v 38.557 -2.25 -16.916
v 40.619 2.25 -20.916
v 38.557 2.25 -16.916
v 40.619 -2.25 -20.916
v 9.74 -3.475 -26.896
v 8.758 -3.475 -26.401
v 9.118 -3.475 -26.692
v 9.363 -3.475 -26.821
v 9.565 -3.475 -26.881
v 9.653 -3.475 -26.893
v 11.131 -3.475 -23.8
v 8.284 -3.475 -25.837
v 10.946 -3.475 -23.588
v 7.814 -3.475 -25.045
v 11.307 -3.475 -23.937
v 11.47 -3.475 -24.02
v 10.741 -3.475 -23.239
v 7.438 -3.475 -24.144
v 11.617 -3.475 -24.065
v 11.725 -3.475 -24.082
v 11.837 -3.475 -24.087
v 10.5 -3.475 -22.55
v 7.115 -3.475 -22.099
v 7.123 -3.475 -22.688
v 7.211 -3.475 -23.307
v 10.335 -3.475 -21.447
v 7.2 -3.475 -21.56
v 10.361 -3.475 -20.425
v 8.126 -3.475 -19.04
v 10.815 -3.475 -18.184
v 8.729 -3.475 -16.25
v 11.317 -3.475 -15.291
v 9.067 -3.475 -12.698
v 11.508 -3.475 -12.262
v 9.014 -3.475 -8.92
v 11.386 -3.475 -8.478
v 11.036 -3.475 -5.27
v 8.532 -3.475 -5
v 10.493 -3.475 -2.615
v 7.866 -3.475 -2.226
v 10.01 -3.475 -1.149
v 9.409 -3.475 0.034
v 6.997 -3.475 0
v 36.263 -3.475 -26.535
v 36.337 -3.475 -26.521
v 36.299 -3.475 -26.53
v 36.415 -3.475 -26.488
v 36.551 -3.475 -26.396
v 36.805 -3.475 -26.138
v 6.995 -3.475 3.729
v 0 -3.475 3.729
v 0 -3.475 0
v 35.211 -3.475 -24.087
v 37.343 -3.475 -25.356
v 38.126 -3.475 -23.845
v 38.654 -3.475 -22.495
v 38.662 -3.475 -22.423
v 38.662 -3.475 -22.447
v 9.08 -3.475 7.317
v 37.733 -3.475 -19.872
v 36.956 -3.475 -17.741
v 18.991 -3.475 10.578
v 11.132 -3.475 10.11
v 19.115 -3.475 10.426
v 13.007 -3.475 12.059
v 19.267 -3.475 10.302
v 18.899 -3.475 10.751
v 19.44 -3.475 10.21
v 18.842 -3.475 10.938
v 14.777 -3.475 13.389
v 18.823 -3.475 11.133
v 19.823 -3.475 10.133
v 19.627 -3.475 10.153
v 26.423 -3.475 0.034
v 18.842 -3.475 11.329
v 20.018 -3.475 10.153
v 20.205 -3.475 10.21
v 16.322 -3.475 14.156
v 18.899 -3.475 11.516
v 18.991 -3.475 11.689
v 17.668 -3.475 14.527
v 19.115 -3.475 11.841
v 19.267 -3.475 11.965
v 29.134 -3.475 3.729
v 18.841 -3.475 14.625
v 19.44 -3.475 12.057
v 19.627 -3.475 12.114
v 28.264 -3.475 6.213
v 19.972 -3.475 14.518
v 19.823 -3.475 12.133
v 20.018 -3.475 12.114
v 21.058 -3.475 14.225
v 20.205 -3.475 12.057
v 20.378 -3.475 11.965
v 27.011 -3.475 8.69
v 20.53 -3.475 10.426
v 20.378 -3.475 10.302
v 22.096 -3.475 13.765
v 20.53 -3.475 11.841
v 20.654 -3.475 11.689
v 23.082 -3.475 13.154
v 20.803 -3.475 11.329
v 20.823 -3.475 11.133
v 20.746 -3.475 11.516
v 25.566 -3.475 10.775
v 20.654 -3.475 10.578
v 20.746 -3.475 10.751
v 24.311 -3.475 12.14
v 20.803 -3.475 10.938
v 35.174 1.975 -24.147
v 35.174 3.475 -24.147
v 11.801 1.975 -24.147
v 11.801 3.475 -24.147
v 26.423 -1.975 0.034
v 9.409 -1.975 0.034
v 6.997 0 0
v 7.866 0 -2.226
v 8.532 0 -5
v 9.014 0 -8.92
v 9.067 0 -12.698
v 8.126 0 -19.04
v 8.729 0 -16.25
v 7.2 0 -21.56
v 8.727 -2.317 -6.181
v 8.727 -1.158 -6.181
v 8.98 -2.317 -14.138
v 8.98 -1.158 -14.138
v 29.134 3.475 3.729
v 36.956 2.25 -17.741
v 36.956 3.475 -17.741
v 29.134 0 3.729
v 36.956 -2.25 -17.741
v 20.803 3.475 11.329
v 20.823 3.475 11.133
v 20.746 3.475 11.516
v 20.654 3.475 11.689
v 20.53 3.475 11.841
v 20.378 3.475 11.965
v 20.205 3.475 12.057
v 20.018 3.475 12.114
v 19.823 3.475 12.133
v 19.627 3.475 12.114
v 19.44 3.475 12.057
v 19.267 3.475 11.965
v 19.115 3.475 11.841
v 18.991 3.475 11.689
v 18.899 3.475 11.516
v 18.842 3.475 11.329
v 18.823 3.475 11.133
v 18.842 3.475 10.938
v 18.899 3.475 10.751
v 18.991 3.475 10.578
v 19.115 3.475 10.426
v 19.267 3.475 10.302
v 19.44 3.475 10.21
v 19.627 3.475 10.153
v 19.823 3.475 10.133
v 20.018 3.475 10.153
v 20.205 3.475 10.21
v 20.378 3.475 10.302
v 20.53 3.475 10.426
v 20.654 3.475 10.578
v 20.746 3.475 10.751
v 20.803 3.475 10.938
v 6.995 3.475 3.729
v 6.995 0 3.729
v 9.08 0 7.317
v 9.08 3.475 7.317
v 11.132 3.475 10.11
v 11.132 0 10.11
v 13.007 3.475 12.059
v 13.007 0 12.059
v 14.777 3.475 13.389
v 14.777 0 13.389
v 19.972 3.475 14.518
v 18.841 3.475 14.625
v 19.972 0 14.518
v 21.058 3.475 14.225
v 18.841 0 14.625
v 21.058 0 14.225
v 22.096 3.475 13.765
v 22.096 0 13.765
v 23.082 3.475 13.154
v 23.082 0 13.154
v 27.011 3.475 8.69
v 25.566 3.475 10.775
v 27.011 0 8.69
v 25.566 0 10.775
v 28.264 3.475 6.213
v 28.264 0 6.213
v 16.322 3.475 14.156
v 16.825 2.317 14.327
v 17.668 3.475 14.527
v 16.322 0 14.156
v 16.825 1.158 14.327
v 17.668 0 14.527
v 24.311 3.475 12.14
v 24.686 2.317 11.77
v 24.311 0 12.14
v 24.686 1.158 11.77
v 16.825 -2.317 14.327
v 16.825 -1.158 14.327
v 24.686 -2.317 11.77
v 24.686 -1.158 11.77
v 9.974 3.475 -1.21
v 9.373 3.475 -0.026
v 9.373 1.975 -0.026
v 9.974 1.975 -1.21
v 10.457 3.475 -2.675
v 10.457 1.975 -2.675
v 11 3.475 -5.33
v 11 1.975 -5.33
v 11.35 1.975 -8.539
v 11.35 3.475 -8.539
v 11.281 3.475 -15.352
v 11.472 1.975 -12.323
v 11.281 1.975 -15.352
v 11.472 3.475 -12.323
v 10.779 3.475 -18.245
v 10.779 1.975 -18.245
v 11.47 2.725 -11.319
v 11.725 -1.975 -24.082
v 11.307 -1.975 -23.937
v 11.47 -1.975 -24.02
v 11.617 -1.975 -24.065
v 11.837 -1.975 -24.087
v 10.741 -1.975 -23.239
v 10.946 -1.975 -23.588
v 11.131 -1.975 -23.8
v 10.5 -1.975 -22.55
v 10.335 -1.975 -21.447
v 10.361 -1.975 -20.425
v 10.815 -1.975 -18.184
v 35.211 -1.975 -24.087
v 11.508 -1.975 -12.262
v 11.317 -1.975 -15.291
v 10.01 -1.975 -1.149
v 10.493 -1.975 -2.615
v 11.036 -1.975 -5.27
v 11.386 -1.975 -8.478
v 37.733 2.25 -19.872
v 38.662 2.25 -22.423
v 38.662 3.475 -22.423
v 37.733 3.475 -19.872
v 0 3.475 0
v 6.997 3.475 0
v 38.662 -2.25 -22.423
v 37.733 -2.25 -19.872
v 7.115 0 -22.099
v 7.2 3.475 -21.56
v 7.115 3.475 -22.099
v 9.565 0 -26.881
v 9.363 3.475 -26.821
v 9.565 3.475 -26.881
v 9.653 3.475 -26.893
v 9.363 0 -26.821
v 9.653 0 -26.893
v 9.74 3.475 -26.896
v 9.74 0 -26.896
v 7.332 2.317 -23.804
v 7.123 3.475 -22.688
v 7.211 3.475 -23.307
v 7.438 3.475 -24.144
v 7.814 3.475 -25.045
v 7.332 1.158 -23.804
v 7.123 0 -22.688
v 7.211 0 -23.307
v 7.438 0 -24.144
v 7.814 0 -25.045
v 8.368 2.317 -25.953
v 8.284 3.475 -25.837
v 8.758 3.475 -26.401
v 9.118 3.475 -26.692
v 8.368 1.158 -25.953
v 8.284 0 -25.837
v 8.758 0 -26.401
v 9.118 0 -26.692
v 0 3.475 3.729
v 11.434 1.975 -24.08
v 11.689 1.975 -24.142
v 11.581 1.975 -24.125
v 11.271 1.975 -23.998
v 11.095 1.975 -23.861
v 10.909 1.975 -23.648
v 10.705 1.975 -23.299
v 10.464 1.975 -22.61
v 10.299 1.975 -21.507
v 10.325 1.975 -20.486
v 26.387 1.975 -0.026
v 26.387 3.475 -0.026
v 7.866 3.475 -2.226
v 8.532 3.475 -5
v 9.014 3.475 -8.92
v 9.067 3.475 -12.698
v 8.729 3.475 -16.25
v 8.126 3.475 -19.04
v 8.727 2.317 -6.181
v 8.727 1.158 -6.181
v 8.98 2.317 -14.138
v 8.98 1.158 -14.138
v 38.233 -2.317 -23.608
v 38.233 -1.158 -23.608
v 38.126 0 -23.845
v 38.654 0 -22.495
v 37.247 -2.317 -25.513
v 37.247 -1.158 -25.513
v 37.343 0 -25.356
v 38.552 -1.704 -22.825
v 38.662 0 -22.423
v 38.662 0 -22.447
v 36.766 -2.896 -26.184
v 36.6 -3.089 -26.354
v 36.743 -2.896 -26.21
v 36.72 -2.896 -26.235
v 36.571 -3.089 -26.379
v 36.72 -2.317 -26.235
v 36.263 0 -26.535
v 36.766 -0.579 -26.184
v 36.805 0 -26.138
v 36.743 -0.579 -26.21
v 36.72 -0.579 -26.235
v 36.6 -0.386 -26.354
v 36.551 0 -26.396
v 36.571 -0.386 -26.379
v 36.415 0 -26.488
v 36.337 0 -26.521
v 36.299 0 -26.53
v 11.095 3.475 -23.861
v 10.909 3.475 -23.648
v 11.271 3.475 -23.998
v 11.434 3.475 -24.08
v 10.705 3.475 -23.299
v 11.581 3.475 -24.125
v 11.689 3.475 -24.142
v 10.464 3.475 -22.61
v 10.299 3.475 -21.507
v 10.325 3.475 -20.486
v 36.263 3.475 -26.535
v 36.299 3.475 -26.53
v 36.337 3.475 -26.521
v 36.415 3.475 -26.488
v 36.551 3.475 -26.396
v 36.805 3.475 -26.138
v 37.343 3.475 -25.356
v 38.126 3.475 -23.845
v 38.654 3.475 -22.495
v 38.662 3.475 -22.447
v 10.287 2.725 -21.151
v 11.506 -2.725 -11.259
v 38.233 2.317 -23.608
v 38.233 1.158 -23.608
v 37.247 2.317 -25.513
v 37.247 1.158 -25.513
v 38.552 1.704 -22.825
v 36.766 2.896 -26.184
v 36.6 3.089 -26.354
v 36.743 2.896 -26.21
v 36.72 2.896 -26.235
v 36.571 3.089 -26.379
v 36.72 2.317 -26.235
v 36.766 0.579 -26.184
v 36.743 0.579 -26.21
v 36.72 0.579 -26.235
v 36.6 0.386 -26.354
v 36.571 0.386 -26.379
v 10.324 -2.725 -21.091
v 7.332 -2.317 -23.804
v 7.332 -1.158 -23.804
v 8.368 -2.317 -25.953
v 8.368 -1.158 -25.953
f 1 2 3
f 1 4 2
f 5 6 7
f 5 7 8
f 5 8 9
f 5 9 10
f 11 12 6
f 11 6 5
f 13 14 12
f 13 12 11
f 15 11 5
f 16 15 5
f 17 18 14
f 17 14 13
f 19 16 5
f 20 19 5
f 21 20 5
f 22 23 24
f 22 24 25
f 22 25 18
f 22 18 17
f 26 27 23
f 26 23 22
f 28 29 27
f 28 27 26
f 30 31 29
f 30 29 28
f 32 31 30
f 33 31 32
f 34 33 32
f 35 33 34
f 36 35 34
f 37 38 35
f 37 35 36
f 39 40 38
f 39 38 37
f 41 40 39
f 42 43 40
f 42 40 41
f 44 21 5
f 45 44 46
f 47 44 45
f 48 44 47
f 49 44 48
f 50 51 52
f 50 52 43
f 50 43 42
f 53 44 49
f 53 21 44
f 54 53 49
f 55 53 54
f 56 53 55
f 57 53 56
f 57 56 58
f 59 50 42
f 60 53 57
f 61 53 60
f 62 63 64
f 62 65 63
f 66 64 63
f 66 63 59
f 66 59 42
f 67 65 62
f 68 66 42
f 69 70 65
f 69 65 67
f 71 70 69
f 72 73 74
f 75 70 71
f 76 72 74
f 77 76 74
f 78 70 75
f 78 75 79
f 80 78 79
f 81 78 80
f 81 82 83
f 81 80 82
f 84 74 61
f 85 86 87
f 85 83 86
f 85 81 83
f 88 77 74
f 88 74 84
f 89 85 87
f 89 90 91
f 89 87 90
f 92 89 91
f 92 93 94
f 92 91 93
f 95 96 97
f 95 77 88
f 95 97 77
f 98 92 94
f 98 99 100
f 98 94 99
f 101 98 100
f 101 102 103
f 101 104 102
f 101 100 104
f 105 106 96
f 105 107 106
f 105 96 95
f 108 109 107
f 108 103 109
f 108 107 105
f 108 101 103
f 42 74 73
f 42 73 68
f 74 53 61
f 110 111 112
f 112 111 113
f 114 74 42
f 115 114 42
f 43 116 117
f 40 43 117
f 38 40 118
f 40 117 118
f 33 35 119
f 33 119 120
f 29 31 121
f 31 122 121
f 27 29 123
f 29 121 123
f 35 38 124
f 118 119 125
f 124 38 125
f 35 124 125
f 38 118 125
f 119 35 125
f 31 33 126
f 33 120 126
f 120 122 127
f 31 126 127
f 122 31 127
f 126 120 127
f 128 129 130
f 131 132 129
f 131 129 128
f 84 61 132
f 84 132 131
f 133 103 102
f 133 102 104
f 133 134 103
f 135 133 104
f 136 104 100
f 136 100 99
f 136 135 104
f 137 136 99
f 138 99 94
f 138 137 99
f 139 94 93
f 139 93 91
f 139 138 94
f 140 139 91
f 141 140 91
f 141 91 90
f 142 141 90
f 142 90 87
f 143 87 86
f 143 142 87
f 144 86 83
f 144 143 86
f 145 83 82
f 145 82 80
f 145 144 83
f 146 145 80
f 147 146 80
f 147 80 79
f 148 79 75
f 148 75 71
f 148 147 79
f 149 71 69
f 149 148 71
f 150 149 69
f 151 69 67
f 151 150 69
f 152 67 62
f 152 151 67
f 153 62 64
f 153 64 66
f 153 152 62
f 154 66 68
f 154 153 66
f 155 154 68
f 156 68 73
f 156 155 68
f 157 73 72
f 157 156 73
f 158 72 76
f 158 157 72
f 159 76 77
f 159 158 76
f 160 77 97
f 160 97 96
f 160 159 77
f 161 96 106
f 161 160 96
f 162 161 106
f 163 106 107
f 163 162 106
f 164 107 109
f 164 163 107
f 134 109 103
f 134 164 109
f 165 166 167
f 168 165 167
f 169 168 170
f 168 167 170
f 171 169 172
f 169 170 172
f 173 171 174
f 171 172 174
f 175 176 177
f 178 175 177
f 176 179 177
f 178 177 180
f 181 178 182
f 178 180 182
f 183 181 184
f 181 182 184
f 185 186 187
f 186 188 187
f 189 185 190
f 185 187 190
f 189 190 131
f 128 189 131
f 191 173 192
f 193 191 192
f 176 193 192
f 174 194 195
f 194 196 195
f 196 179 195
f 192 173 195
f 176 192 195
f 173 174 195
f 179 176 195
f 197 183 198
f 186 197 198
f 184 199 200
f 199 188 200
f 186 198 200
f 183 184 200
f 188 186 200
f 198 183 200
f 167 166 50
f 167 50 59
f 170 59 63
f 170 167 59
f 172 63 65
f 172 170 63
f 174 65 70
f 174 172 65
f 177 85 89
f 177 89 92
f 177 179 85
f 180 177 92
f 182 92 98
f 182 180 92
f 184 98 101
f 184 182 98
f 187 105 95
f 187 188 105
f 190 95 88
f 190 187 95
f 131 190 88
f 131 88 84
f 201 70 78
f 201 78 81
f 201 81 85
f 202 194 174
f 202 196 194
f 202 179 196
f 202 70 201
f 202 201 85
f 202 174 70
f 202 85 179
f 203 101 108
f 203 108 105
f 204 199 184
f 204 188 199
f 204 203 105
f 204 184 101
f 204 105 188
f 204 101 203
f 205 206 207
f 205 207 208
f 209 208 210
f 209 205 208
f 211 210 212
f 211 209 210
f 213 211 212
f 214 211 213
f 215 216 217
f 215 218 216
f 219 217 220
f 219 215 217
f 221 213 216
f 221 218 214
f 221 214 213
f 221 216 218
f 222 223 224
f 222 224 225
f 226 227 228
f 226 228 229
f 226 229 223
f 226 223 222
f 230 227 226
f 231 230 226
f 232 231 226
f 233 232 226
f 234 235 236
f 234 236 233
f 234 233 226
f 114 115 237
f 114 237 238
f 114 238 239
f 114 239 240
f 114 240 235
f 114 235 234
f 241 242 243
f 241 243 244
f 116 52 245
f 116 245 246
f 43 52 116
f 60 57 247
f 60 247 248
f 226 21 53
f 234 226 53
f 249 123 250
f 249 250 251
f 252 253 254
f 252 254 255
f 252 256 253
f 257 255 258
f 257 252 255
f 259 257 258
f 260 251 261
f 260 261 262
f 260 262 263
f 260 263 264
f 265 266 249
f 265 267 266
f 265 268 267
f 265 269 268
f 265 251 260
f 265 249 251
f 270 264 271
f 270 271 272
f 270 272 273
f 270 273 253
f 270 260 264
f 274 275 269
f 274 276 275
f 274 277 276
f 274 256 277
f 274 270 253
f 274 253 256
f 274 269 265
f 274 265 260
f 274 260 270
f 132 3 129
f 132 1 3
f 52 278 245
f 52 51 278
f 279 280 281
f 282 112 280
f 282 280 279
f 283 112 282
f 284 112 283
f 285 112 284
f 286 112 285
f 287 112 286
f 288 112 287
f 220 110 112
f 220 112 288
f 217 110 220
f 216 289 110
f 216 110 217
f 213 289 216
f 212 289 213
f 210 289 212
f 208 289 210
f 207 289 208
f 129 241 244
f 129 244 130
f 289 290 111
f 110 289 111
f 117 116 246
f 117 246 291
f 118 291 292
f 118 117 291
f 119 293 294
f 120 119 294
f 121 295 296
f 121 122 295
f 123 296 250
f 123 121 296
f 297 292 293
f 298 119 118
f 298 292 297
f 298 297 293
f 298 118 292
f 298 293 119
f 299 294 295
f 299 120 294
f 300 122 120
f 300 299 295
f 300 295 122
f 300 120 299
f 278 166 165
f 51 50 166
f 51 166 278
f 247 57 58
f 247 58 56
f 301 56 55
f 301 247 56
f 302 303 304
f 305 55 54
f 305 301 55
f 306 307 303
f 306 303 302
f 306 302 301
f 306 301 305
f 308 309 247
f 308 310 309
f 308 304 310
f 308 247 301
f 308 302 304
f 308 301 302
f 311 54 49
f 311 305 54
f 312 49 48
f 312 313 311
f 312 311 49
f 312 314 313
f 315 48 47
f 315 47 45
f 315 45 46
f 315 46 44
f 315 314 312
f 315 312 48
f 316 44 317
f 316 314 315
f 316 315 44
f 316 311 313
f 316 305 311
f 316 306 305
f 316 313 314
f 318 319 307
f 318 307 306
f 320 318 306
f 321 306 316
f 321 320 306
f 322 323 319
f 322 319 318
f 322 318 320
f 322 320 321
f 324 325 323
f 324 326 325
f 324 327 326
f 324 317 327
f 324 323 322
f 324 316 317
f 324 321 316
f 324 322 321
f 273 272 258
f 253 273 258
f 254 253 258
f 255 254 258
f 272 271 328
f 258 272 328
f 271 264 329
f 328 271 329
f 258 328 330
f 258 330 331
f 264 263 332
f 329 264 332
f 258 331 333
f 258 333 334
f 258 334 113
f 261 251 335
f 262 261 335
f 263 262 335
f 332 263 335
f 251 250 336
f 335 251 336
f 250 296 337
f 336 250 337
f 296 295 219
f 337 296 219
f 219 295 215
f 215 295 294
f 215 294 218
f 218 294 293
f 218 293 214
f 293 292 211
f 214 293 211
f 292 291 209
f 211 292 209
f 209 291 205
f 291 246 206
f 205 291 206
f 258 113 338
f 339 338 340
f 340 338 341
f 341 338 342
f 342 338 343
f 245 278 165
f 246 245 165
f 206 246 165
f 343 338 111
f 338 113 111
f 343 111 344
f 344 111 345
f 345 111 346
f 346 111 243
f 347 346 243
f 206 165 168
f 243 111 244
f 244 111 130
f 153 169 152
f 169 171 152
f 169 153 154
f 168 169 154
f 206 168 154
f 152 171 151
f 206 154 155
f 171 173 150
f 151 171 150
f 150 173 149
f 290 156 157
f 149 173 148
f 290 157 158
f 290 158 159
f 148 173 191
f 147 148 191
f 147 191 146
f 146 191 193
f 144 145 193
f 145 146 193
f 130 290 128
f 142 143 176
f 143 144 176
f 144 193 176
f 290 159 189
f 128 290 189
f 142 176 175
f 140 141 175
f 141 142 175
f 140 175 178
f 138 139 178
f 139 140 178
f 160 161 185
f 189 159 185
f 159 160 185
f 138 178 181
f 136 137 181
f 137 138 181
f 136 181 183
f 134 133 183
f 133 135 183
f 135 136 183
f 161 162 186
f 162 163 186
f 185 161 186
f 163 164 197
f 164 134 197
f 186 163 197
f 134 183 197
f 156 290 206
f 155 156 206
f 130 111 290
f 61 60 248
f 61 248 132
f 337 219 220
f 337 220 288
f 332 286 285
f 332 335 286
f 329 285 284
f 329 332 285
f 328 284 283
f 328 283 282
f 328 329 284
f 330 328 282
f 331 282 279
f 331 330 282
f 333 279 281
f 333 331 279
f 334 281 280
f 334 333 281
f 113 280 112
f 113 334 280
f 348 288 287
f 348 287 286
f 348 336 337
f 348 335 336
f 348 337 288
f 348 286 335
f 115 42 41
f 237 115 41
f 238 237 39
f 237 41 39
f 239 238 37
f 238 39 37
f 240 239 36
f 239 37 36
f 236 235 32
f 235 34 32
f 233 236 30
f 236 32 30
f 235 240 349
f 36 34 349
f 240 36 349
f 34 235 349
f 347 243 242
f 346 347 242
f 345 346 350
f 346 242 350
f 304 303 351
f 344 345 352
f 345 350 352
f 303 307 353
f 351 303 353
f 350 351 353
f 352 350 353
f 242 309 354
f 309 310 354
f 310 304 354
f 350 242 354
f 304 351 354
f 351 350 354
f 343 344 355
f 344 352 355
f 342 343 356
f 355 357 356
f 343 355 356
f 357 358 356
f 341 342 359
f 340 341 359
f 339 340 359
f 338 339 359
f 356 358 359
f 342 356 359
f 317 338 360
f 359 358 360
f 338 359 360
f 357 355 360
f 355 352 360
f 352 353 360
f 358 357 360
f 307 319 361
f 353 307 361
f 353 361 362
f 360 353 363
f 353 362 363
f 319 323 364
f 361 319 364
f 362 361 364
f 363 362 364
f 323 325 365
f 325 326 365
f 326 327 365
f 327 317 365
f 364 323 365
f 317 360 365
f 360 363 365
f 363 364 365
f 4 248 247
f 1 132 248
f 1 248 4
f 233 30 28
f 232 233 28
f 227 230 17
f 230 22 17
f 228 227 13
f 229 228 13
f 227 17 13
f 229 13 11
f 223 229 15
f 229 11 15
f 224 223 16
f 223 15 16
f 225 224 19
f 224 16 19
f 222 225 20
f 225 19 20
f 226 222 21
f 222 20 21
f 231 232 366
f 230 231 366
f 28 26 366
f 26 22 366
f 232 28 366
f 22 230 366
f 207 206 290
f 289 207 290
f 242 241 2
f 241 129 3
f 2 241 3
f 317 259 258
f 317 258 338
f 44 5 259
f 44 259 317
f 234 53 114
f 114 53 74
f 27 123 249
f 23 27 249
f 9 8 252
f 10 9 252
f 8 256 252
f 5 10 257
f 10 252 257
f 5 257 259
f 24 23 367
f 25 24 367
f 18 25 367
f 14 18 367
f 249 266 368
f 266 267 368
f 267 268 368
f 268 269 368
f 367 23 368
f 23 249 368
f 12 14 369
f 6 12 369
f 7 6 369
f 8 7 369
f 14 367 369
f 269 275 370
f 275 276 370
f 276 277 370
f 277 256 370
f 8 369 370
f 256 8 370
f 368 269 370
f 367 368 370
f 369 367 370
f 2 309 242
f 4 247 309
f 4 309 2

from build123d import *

# Parameters (mm, degrees)
F0_R     = 1
F1_DEPTH = 3.475
F2_DEPTH = 2.25
F4_DEPTH = 1.5
F6_DEPTH = 1.5


with BuildPart() as f1:
    # F0 (on Front) → F1 (new body, symmetric)
    with BuildSketch(Plane.XZ):
        with BuildLine():
            Line((0, 3.7288318854), (0, 0))
            Line((0, 0), (6.9967252202, 0))
            add(Edge.make_bspline(
                [(6.9967252202, 0), (9.2797642574, -4.5221908949), (10.1809287444, -15.1755161159), (7.2002517991, -21.5603647329)],
                knots=[0, 0, 0, 0, 21.5613253416, 21.5613253416, 21.5613253416, 21.5613253416], degree=3))
            add(Edge.make_bspline(
                [(7.2002517991, -21.5603647329), (6.6914390773, -23.4825400211), (8.3887010693, -26.9248684867), (9.7404803961, -26.8961938314)],
                knots=[0, 0, 0, 0, 5.9096390324, 5.9096390324, 5.9096390324, 5.9096390324], degree=3))
            Line((9.7404803961, -26.8961938314), (36.2628367926, -26.5350107441))
            add(Edge.make_bspline(
                [(38.6619754136, -22.4225856364), (38.6969335377, -22.7146428078), (37.0609843214, -26.4885407062), (36.2628367926, -26.5350107441)],
                knots=[0, 0, 0, 0, 4.7610824808, 4.7610824808, 4.7610824808, 4.7610824808], degree=3))
            Line((38.6619754136, -22.4225856364), (37.7328934056, -19.8724068204))
            Line((37.7328934056, -19.8724068204), (36.9564835581, -17.741288223))
            Line((36.9564835581, -17.741288223), (29.1344821453, 3.7288318854))
            add(Edge.make_bspline(
                [(6.9949179888, 3.7288318854), (17.3287056386, 23.4605930746), (26.8724299967, 11.955557391), (29.1344821453, 3.7288318854)],
                knots=[0, 0, 0, 0, 22.1395641565, 22.1395641565, 22.1395641565, 22.1395641565], degree=3))
            Line((6.9949179888, 3.7288318854), (0, 3.7288318854))
        make_face()
        with BuildLine():
            add(Edge.make_bspline(
                [(9.4467252202, 0), (10.9906066209, -2.3621518631), (11.8817396227, -11.8382899378), (11.3527391163, -15.8558540684), (10.8528801655, -18.2185956272)],
                knots=[0, 0, 0, 0, 0.5622964622, 1, 1, 1, 1], degree=3))
            Line((9.4467252202, 0), (26.4606260202, 0))
            Line((26.4606260202, 0), (35.2483888837, -24.1209780218))
            Line((35.2483888837, -24.1209780218), (32.2012024882, -24.1209780218))
            Line((32.2012024882, -24.1209780218), (11.8752977761, -24.1209780218))
            add(Edge.make_bspline(
                [(10.8528801655, -18.2185956272), (10.6736963888, -19.4107137837), (10.0184677383, -20.6313388233), (10.7373066785, -24.130475951), (11.8752977761, -24.1209780218)],
                knots=[0, 0, 0, 0, 0.4837506013, 1, 1, 1, 1], degree=3))
        make_face(mode=Mode.SUBTRACT)
        with Locations((19.8225565255, 11.1334240064)):
            Circle(F0_R, mode=Mode.SUBTRACT)
        with BuildLine():
            Line((26.4606260202, 0), (9.4467252202, 0))
            add(Edge.make_bspline(
                [(9.4467252202, 0), (10.9906066209, -2.3621518631), (11.8817396227, -11.8382899378), (11.3527391163, -15.8558540684), (10.8528801655, -18.2185956272)],
                knots=[0, 0, 0, 0, 0.5622964622, 1, 1, 1, 1], degree=3))
            add(Edge.make_bspline(
                [(10.8528801655, -18.2185956272), (10.6736963888, -19.4107137837), (10.0184677383, -20.6313388233), (10.7373066785, -24.130475951), (11.8752977761, -24.1209780218)],
                knots=[0, 0, 0, 0, 0.4837506013, 1, 1, 1, 1], degree=3))
            Line((11.8752977761, -24.1209780218), (32.2012024882, -24.1209780218))
            Line((32.2012024882, -24.1209780218), (35.2483888837, -24.1209780218))
            Line((35.2483888837, -24.1209780218), (26.4606260202, 0))
        make_face()
    extrude(amount=F1_DEPTH, both=True)

    # F0 (on Front) → F2 (join, symmetric)
    with BuildSketch(Plane.XZ):
        Polygon((38.5574395408, -16.9160417945), (36.9564835581, -17.741288223), (37.7328934056, -19.8724068204), (39.5883468265, -18.9159743354), align=None)
        Polygon((39.5883468265, -18.9159743354), (37.7328934056, -19.8724068204), (38.6619754136, -22.4225856364), (40.6192541122, -20.9159068763), align=None)
    extrude(amount=F2_DEPTH, both=True)

    # F3 (on face) → F4 (cut)
    with BuildSketch(Plane.XZ.offset(3.475)):
        with BuildLine():
            Line((26.4228218723, 0.0341487469), (9.4089210724, 0.0341487469))
            add(Edge.make_bspline(
                [(9.4089210724, 0.0341487469), (10.9528024731, -2.3280031162), (11.8439354748, -11.804141191), (11.3149349685, -15.8217053215), (10.8150760177, -18.1844468803)],
                knots=[0, 0, 0, 0, 0.5622964622, 1, 1, 1, 1], degree=3))
            add(Edge.make_bspline(
                [(10.8150760177, -18.1844468803), (10.635892241, -19.3765650368), (9.9806635904, -20.5971900764), (10.6995025306, -24.0963272041), (11.8374936283, -24.0868292749)],
                knots=[0, 0, 0, 0, 0.4837506013, 1, 1, 1, 1], degree=3))
            Line((11.8374936283, -24.0868292749), (32.1633983403, -24.0868292749))
            Line((32.1633983403, -24.0868292749), (35.2105847359, -24.0868292749))
            Line((35.2105847359, -24.0868292749), (26.4228218723, 0.0341487469))
        make_face()
    extrude(amount=-F4_DEPTH, mode=Mode.SUBTRACT)

    # F5 (on face) → F6 (cut)
    with BuildSketch(Plane(origin=(0, 3.475, 0), x_dir=(-1, 0, 0), z_dir=(0, 1, 0))):
        with BuildLine():
            Line((-26.3866665531, -0.0262773244), (-35.1744294167, -24.1472553462))
            Line((-35.1744294167, -24.1472553462), (-32.1272430211, -24.1472553462))
            Line((-32.1272430211, -24.1472553462), (-11.8013383091, -24.1472553462))
            add(Edge.make_bspline(
                [(-10.7789206985, -18.2448729516), (-10.5997369218, -19.4369911081), (-9.9445082712, -20.6576161477), (-10.6633472114, -24.1567532754), (-11.8013383091, -24.1472553462)],
                knots=[0, 0, 0, 0, 0.4837506013, 1, 1, 1, 1], degree=3))
            add(Edge.make_bspline(
                [(-9.3727657532, -0.0262773244), (-10.9166471538, -2.3884291875), (-11.8077801556, -11.8645672622), (-11.2787796492, -15.8821313928), (-10.7789206985, -18.2448729516)],
                knots=[0, 0, 0, 0, 0.5622964622, 1, 1, 1, 1], degree=3))
            Line((-9.3727657532, -0.0262773244), (-26.3866665531, -0.0262773244))
        make_face()
    extrude(amount=-F6_DEPTH, mode=Mode.SUBTRACT)


solid = f1.part
